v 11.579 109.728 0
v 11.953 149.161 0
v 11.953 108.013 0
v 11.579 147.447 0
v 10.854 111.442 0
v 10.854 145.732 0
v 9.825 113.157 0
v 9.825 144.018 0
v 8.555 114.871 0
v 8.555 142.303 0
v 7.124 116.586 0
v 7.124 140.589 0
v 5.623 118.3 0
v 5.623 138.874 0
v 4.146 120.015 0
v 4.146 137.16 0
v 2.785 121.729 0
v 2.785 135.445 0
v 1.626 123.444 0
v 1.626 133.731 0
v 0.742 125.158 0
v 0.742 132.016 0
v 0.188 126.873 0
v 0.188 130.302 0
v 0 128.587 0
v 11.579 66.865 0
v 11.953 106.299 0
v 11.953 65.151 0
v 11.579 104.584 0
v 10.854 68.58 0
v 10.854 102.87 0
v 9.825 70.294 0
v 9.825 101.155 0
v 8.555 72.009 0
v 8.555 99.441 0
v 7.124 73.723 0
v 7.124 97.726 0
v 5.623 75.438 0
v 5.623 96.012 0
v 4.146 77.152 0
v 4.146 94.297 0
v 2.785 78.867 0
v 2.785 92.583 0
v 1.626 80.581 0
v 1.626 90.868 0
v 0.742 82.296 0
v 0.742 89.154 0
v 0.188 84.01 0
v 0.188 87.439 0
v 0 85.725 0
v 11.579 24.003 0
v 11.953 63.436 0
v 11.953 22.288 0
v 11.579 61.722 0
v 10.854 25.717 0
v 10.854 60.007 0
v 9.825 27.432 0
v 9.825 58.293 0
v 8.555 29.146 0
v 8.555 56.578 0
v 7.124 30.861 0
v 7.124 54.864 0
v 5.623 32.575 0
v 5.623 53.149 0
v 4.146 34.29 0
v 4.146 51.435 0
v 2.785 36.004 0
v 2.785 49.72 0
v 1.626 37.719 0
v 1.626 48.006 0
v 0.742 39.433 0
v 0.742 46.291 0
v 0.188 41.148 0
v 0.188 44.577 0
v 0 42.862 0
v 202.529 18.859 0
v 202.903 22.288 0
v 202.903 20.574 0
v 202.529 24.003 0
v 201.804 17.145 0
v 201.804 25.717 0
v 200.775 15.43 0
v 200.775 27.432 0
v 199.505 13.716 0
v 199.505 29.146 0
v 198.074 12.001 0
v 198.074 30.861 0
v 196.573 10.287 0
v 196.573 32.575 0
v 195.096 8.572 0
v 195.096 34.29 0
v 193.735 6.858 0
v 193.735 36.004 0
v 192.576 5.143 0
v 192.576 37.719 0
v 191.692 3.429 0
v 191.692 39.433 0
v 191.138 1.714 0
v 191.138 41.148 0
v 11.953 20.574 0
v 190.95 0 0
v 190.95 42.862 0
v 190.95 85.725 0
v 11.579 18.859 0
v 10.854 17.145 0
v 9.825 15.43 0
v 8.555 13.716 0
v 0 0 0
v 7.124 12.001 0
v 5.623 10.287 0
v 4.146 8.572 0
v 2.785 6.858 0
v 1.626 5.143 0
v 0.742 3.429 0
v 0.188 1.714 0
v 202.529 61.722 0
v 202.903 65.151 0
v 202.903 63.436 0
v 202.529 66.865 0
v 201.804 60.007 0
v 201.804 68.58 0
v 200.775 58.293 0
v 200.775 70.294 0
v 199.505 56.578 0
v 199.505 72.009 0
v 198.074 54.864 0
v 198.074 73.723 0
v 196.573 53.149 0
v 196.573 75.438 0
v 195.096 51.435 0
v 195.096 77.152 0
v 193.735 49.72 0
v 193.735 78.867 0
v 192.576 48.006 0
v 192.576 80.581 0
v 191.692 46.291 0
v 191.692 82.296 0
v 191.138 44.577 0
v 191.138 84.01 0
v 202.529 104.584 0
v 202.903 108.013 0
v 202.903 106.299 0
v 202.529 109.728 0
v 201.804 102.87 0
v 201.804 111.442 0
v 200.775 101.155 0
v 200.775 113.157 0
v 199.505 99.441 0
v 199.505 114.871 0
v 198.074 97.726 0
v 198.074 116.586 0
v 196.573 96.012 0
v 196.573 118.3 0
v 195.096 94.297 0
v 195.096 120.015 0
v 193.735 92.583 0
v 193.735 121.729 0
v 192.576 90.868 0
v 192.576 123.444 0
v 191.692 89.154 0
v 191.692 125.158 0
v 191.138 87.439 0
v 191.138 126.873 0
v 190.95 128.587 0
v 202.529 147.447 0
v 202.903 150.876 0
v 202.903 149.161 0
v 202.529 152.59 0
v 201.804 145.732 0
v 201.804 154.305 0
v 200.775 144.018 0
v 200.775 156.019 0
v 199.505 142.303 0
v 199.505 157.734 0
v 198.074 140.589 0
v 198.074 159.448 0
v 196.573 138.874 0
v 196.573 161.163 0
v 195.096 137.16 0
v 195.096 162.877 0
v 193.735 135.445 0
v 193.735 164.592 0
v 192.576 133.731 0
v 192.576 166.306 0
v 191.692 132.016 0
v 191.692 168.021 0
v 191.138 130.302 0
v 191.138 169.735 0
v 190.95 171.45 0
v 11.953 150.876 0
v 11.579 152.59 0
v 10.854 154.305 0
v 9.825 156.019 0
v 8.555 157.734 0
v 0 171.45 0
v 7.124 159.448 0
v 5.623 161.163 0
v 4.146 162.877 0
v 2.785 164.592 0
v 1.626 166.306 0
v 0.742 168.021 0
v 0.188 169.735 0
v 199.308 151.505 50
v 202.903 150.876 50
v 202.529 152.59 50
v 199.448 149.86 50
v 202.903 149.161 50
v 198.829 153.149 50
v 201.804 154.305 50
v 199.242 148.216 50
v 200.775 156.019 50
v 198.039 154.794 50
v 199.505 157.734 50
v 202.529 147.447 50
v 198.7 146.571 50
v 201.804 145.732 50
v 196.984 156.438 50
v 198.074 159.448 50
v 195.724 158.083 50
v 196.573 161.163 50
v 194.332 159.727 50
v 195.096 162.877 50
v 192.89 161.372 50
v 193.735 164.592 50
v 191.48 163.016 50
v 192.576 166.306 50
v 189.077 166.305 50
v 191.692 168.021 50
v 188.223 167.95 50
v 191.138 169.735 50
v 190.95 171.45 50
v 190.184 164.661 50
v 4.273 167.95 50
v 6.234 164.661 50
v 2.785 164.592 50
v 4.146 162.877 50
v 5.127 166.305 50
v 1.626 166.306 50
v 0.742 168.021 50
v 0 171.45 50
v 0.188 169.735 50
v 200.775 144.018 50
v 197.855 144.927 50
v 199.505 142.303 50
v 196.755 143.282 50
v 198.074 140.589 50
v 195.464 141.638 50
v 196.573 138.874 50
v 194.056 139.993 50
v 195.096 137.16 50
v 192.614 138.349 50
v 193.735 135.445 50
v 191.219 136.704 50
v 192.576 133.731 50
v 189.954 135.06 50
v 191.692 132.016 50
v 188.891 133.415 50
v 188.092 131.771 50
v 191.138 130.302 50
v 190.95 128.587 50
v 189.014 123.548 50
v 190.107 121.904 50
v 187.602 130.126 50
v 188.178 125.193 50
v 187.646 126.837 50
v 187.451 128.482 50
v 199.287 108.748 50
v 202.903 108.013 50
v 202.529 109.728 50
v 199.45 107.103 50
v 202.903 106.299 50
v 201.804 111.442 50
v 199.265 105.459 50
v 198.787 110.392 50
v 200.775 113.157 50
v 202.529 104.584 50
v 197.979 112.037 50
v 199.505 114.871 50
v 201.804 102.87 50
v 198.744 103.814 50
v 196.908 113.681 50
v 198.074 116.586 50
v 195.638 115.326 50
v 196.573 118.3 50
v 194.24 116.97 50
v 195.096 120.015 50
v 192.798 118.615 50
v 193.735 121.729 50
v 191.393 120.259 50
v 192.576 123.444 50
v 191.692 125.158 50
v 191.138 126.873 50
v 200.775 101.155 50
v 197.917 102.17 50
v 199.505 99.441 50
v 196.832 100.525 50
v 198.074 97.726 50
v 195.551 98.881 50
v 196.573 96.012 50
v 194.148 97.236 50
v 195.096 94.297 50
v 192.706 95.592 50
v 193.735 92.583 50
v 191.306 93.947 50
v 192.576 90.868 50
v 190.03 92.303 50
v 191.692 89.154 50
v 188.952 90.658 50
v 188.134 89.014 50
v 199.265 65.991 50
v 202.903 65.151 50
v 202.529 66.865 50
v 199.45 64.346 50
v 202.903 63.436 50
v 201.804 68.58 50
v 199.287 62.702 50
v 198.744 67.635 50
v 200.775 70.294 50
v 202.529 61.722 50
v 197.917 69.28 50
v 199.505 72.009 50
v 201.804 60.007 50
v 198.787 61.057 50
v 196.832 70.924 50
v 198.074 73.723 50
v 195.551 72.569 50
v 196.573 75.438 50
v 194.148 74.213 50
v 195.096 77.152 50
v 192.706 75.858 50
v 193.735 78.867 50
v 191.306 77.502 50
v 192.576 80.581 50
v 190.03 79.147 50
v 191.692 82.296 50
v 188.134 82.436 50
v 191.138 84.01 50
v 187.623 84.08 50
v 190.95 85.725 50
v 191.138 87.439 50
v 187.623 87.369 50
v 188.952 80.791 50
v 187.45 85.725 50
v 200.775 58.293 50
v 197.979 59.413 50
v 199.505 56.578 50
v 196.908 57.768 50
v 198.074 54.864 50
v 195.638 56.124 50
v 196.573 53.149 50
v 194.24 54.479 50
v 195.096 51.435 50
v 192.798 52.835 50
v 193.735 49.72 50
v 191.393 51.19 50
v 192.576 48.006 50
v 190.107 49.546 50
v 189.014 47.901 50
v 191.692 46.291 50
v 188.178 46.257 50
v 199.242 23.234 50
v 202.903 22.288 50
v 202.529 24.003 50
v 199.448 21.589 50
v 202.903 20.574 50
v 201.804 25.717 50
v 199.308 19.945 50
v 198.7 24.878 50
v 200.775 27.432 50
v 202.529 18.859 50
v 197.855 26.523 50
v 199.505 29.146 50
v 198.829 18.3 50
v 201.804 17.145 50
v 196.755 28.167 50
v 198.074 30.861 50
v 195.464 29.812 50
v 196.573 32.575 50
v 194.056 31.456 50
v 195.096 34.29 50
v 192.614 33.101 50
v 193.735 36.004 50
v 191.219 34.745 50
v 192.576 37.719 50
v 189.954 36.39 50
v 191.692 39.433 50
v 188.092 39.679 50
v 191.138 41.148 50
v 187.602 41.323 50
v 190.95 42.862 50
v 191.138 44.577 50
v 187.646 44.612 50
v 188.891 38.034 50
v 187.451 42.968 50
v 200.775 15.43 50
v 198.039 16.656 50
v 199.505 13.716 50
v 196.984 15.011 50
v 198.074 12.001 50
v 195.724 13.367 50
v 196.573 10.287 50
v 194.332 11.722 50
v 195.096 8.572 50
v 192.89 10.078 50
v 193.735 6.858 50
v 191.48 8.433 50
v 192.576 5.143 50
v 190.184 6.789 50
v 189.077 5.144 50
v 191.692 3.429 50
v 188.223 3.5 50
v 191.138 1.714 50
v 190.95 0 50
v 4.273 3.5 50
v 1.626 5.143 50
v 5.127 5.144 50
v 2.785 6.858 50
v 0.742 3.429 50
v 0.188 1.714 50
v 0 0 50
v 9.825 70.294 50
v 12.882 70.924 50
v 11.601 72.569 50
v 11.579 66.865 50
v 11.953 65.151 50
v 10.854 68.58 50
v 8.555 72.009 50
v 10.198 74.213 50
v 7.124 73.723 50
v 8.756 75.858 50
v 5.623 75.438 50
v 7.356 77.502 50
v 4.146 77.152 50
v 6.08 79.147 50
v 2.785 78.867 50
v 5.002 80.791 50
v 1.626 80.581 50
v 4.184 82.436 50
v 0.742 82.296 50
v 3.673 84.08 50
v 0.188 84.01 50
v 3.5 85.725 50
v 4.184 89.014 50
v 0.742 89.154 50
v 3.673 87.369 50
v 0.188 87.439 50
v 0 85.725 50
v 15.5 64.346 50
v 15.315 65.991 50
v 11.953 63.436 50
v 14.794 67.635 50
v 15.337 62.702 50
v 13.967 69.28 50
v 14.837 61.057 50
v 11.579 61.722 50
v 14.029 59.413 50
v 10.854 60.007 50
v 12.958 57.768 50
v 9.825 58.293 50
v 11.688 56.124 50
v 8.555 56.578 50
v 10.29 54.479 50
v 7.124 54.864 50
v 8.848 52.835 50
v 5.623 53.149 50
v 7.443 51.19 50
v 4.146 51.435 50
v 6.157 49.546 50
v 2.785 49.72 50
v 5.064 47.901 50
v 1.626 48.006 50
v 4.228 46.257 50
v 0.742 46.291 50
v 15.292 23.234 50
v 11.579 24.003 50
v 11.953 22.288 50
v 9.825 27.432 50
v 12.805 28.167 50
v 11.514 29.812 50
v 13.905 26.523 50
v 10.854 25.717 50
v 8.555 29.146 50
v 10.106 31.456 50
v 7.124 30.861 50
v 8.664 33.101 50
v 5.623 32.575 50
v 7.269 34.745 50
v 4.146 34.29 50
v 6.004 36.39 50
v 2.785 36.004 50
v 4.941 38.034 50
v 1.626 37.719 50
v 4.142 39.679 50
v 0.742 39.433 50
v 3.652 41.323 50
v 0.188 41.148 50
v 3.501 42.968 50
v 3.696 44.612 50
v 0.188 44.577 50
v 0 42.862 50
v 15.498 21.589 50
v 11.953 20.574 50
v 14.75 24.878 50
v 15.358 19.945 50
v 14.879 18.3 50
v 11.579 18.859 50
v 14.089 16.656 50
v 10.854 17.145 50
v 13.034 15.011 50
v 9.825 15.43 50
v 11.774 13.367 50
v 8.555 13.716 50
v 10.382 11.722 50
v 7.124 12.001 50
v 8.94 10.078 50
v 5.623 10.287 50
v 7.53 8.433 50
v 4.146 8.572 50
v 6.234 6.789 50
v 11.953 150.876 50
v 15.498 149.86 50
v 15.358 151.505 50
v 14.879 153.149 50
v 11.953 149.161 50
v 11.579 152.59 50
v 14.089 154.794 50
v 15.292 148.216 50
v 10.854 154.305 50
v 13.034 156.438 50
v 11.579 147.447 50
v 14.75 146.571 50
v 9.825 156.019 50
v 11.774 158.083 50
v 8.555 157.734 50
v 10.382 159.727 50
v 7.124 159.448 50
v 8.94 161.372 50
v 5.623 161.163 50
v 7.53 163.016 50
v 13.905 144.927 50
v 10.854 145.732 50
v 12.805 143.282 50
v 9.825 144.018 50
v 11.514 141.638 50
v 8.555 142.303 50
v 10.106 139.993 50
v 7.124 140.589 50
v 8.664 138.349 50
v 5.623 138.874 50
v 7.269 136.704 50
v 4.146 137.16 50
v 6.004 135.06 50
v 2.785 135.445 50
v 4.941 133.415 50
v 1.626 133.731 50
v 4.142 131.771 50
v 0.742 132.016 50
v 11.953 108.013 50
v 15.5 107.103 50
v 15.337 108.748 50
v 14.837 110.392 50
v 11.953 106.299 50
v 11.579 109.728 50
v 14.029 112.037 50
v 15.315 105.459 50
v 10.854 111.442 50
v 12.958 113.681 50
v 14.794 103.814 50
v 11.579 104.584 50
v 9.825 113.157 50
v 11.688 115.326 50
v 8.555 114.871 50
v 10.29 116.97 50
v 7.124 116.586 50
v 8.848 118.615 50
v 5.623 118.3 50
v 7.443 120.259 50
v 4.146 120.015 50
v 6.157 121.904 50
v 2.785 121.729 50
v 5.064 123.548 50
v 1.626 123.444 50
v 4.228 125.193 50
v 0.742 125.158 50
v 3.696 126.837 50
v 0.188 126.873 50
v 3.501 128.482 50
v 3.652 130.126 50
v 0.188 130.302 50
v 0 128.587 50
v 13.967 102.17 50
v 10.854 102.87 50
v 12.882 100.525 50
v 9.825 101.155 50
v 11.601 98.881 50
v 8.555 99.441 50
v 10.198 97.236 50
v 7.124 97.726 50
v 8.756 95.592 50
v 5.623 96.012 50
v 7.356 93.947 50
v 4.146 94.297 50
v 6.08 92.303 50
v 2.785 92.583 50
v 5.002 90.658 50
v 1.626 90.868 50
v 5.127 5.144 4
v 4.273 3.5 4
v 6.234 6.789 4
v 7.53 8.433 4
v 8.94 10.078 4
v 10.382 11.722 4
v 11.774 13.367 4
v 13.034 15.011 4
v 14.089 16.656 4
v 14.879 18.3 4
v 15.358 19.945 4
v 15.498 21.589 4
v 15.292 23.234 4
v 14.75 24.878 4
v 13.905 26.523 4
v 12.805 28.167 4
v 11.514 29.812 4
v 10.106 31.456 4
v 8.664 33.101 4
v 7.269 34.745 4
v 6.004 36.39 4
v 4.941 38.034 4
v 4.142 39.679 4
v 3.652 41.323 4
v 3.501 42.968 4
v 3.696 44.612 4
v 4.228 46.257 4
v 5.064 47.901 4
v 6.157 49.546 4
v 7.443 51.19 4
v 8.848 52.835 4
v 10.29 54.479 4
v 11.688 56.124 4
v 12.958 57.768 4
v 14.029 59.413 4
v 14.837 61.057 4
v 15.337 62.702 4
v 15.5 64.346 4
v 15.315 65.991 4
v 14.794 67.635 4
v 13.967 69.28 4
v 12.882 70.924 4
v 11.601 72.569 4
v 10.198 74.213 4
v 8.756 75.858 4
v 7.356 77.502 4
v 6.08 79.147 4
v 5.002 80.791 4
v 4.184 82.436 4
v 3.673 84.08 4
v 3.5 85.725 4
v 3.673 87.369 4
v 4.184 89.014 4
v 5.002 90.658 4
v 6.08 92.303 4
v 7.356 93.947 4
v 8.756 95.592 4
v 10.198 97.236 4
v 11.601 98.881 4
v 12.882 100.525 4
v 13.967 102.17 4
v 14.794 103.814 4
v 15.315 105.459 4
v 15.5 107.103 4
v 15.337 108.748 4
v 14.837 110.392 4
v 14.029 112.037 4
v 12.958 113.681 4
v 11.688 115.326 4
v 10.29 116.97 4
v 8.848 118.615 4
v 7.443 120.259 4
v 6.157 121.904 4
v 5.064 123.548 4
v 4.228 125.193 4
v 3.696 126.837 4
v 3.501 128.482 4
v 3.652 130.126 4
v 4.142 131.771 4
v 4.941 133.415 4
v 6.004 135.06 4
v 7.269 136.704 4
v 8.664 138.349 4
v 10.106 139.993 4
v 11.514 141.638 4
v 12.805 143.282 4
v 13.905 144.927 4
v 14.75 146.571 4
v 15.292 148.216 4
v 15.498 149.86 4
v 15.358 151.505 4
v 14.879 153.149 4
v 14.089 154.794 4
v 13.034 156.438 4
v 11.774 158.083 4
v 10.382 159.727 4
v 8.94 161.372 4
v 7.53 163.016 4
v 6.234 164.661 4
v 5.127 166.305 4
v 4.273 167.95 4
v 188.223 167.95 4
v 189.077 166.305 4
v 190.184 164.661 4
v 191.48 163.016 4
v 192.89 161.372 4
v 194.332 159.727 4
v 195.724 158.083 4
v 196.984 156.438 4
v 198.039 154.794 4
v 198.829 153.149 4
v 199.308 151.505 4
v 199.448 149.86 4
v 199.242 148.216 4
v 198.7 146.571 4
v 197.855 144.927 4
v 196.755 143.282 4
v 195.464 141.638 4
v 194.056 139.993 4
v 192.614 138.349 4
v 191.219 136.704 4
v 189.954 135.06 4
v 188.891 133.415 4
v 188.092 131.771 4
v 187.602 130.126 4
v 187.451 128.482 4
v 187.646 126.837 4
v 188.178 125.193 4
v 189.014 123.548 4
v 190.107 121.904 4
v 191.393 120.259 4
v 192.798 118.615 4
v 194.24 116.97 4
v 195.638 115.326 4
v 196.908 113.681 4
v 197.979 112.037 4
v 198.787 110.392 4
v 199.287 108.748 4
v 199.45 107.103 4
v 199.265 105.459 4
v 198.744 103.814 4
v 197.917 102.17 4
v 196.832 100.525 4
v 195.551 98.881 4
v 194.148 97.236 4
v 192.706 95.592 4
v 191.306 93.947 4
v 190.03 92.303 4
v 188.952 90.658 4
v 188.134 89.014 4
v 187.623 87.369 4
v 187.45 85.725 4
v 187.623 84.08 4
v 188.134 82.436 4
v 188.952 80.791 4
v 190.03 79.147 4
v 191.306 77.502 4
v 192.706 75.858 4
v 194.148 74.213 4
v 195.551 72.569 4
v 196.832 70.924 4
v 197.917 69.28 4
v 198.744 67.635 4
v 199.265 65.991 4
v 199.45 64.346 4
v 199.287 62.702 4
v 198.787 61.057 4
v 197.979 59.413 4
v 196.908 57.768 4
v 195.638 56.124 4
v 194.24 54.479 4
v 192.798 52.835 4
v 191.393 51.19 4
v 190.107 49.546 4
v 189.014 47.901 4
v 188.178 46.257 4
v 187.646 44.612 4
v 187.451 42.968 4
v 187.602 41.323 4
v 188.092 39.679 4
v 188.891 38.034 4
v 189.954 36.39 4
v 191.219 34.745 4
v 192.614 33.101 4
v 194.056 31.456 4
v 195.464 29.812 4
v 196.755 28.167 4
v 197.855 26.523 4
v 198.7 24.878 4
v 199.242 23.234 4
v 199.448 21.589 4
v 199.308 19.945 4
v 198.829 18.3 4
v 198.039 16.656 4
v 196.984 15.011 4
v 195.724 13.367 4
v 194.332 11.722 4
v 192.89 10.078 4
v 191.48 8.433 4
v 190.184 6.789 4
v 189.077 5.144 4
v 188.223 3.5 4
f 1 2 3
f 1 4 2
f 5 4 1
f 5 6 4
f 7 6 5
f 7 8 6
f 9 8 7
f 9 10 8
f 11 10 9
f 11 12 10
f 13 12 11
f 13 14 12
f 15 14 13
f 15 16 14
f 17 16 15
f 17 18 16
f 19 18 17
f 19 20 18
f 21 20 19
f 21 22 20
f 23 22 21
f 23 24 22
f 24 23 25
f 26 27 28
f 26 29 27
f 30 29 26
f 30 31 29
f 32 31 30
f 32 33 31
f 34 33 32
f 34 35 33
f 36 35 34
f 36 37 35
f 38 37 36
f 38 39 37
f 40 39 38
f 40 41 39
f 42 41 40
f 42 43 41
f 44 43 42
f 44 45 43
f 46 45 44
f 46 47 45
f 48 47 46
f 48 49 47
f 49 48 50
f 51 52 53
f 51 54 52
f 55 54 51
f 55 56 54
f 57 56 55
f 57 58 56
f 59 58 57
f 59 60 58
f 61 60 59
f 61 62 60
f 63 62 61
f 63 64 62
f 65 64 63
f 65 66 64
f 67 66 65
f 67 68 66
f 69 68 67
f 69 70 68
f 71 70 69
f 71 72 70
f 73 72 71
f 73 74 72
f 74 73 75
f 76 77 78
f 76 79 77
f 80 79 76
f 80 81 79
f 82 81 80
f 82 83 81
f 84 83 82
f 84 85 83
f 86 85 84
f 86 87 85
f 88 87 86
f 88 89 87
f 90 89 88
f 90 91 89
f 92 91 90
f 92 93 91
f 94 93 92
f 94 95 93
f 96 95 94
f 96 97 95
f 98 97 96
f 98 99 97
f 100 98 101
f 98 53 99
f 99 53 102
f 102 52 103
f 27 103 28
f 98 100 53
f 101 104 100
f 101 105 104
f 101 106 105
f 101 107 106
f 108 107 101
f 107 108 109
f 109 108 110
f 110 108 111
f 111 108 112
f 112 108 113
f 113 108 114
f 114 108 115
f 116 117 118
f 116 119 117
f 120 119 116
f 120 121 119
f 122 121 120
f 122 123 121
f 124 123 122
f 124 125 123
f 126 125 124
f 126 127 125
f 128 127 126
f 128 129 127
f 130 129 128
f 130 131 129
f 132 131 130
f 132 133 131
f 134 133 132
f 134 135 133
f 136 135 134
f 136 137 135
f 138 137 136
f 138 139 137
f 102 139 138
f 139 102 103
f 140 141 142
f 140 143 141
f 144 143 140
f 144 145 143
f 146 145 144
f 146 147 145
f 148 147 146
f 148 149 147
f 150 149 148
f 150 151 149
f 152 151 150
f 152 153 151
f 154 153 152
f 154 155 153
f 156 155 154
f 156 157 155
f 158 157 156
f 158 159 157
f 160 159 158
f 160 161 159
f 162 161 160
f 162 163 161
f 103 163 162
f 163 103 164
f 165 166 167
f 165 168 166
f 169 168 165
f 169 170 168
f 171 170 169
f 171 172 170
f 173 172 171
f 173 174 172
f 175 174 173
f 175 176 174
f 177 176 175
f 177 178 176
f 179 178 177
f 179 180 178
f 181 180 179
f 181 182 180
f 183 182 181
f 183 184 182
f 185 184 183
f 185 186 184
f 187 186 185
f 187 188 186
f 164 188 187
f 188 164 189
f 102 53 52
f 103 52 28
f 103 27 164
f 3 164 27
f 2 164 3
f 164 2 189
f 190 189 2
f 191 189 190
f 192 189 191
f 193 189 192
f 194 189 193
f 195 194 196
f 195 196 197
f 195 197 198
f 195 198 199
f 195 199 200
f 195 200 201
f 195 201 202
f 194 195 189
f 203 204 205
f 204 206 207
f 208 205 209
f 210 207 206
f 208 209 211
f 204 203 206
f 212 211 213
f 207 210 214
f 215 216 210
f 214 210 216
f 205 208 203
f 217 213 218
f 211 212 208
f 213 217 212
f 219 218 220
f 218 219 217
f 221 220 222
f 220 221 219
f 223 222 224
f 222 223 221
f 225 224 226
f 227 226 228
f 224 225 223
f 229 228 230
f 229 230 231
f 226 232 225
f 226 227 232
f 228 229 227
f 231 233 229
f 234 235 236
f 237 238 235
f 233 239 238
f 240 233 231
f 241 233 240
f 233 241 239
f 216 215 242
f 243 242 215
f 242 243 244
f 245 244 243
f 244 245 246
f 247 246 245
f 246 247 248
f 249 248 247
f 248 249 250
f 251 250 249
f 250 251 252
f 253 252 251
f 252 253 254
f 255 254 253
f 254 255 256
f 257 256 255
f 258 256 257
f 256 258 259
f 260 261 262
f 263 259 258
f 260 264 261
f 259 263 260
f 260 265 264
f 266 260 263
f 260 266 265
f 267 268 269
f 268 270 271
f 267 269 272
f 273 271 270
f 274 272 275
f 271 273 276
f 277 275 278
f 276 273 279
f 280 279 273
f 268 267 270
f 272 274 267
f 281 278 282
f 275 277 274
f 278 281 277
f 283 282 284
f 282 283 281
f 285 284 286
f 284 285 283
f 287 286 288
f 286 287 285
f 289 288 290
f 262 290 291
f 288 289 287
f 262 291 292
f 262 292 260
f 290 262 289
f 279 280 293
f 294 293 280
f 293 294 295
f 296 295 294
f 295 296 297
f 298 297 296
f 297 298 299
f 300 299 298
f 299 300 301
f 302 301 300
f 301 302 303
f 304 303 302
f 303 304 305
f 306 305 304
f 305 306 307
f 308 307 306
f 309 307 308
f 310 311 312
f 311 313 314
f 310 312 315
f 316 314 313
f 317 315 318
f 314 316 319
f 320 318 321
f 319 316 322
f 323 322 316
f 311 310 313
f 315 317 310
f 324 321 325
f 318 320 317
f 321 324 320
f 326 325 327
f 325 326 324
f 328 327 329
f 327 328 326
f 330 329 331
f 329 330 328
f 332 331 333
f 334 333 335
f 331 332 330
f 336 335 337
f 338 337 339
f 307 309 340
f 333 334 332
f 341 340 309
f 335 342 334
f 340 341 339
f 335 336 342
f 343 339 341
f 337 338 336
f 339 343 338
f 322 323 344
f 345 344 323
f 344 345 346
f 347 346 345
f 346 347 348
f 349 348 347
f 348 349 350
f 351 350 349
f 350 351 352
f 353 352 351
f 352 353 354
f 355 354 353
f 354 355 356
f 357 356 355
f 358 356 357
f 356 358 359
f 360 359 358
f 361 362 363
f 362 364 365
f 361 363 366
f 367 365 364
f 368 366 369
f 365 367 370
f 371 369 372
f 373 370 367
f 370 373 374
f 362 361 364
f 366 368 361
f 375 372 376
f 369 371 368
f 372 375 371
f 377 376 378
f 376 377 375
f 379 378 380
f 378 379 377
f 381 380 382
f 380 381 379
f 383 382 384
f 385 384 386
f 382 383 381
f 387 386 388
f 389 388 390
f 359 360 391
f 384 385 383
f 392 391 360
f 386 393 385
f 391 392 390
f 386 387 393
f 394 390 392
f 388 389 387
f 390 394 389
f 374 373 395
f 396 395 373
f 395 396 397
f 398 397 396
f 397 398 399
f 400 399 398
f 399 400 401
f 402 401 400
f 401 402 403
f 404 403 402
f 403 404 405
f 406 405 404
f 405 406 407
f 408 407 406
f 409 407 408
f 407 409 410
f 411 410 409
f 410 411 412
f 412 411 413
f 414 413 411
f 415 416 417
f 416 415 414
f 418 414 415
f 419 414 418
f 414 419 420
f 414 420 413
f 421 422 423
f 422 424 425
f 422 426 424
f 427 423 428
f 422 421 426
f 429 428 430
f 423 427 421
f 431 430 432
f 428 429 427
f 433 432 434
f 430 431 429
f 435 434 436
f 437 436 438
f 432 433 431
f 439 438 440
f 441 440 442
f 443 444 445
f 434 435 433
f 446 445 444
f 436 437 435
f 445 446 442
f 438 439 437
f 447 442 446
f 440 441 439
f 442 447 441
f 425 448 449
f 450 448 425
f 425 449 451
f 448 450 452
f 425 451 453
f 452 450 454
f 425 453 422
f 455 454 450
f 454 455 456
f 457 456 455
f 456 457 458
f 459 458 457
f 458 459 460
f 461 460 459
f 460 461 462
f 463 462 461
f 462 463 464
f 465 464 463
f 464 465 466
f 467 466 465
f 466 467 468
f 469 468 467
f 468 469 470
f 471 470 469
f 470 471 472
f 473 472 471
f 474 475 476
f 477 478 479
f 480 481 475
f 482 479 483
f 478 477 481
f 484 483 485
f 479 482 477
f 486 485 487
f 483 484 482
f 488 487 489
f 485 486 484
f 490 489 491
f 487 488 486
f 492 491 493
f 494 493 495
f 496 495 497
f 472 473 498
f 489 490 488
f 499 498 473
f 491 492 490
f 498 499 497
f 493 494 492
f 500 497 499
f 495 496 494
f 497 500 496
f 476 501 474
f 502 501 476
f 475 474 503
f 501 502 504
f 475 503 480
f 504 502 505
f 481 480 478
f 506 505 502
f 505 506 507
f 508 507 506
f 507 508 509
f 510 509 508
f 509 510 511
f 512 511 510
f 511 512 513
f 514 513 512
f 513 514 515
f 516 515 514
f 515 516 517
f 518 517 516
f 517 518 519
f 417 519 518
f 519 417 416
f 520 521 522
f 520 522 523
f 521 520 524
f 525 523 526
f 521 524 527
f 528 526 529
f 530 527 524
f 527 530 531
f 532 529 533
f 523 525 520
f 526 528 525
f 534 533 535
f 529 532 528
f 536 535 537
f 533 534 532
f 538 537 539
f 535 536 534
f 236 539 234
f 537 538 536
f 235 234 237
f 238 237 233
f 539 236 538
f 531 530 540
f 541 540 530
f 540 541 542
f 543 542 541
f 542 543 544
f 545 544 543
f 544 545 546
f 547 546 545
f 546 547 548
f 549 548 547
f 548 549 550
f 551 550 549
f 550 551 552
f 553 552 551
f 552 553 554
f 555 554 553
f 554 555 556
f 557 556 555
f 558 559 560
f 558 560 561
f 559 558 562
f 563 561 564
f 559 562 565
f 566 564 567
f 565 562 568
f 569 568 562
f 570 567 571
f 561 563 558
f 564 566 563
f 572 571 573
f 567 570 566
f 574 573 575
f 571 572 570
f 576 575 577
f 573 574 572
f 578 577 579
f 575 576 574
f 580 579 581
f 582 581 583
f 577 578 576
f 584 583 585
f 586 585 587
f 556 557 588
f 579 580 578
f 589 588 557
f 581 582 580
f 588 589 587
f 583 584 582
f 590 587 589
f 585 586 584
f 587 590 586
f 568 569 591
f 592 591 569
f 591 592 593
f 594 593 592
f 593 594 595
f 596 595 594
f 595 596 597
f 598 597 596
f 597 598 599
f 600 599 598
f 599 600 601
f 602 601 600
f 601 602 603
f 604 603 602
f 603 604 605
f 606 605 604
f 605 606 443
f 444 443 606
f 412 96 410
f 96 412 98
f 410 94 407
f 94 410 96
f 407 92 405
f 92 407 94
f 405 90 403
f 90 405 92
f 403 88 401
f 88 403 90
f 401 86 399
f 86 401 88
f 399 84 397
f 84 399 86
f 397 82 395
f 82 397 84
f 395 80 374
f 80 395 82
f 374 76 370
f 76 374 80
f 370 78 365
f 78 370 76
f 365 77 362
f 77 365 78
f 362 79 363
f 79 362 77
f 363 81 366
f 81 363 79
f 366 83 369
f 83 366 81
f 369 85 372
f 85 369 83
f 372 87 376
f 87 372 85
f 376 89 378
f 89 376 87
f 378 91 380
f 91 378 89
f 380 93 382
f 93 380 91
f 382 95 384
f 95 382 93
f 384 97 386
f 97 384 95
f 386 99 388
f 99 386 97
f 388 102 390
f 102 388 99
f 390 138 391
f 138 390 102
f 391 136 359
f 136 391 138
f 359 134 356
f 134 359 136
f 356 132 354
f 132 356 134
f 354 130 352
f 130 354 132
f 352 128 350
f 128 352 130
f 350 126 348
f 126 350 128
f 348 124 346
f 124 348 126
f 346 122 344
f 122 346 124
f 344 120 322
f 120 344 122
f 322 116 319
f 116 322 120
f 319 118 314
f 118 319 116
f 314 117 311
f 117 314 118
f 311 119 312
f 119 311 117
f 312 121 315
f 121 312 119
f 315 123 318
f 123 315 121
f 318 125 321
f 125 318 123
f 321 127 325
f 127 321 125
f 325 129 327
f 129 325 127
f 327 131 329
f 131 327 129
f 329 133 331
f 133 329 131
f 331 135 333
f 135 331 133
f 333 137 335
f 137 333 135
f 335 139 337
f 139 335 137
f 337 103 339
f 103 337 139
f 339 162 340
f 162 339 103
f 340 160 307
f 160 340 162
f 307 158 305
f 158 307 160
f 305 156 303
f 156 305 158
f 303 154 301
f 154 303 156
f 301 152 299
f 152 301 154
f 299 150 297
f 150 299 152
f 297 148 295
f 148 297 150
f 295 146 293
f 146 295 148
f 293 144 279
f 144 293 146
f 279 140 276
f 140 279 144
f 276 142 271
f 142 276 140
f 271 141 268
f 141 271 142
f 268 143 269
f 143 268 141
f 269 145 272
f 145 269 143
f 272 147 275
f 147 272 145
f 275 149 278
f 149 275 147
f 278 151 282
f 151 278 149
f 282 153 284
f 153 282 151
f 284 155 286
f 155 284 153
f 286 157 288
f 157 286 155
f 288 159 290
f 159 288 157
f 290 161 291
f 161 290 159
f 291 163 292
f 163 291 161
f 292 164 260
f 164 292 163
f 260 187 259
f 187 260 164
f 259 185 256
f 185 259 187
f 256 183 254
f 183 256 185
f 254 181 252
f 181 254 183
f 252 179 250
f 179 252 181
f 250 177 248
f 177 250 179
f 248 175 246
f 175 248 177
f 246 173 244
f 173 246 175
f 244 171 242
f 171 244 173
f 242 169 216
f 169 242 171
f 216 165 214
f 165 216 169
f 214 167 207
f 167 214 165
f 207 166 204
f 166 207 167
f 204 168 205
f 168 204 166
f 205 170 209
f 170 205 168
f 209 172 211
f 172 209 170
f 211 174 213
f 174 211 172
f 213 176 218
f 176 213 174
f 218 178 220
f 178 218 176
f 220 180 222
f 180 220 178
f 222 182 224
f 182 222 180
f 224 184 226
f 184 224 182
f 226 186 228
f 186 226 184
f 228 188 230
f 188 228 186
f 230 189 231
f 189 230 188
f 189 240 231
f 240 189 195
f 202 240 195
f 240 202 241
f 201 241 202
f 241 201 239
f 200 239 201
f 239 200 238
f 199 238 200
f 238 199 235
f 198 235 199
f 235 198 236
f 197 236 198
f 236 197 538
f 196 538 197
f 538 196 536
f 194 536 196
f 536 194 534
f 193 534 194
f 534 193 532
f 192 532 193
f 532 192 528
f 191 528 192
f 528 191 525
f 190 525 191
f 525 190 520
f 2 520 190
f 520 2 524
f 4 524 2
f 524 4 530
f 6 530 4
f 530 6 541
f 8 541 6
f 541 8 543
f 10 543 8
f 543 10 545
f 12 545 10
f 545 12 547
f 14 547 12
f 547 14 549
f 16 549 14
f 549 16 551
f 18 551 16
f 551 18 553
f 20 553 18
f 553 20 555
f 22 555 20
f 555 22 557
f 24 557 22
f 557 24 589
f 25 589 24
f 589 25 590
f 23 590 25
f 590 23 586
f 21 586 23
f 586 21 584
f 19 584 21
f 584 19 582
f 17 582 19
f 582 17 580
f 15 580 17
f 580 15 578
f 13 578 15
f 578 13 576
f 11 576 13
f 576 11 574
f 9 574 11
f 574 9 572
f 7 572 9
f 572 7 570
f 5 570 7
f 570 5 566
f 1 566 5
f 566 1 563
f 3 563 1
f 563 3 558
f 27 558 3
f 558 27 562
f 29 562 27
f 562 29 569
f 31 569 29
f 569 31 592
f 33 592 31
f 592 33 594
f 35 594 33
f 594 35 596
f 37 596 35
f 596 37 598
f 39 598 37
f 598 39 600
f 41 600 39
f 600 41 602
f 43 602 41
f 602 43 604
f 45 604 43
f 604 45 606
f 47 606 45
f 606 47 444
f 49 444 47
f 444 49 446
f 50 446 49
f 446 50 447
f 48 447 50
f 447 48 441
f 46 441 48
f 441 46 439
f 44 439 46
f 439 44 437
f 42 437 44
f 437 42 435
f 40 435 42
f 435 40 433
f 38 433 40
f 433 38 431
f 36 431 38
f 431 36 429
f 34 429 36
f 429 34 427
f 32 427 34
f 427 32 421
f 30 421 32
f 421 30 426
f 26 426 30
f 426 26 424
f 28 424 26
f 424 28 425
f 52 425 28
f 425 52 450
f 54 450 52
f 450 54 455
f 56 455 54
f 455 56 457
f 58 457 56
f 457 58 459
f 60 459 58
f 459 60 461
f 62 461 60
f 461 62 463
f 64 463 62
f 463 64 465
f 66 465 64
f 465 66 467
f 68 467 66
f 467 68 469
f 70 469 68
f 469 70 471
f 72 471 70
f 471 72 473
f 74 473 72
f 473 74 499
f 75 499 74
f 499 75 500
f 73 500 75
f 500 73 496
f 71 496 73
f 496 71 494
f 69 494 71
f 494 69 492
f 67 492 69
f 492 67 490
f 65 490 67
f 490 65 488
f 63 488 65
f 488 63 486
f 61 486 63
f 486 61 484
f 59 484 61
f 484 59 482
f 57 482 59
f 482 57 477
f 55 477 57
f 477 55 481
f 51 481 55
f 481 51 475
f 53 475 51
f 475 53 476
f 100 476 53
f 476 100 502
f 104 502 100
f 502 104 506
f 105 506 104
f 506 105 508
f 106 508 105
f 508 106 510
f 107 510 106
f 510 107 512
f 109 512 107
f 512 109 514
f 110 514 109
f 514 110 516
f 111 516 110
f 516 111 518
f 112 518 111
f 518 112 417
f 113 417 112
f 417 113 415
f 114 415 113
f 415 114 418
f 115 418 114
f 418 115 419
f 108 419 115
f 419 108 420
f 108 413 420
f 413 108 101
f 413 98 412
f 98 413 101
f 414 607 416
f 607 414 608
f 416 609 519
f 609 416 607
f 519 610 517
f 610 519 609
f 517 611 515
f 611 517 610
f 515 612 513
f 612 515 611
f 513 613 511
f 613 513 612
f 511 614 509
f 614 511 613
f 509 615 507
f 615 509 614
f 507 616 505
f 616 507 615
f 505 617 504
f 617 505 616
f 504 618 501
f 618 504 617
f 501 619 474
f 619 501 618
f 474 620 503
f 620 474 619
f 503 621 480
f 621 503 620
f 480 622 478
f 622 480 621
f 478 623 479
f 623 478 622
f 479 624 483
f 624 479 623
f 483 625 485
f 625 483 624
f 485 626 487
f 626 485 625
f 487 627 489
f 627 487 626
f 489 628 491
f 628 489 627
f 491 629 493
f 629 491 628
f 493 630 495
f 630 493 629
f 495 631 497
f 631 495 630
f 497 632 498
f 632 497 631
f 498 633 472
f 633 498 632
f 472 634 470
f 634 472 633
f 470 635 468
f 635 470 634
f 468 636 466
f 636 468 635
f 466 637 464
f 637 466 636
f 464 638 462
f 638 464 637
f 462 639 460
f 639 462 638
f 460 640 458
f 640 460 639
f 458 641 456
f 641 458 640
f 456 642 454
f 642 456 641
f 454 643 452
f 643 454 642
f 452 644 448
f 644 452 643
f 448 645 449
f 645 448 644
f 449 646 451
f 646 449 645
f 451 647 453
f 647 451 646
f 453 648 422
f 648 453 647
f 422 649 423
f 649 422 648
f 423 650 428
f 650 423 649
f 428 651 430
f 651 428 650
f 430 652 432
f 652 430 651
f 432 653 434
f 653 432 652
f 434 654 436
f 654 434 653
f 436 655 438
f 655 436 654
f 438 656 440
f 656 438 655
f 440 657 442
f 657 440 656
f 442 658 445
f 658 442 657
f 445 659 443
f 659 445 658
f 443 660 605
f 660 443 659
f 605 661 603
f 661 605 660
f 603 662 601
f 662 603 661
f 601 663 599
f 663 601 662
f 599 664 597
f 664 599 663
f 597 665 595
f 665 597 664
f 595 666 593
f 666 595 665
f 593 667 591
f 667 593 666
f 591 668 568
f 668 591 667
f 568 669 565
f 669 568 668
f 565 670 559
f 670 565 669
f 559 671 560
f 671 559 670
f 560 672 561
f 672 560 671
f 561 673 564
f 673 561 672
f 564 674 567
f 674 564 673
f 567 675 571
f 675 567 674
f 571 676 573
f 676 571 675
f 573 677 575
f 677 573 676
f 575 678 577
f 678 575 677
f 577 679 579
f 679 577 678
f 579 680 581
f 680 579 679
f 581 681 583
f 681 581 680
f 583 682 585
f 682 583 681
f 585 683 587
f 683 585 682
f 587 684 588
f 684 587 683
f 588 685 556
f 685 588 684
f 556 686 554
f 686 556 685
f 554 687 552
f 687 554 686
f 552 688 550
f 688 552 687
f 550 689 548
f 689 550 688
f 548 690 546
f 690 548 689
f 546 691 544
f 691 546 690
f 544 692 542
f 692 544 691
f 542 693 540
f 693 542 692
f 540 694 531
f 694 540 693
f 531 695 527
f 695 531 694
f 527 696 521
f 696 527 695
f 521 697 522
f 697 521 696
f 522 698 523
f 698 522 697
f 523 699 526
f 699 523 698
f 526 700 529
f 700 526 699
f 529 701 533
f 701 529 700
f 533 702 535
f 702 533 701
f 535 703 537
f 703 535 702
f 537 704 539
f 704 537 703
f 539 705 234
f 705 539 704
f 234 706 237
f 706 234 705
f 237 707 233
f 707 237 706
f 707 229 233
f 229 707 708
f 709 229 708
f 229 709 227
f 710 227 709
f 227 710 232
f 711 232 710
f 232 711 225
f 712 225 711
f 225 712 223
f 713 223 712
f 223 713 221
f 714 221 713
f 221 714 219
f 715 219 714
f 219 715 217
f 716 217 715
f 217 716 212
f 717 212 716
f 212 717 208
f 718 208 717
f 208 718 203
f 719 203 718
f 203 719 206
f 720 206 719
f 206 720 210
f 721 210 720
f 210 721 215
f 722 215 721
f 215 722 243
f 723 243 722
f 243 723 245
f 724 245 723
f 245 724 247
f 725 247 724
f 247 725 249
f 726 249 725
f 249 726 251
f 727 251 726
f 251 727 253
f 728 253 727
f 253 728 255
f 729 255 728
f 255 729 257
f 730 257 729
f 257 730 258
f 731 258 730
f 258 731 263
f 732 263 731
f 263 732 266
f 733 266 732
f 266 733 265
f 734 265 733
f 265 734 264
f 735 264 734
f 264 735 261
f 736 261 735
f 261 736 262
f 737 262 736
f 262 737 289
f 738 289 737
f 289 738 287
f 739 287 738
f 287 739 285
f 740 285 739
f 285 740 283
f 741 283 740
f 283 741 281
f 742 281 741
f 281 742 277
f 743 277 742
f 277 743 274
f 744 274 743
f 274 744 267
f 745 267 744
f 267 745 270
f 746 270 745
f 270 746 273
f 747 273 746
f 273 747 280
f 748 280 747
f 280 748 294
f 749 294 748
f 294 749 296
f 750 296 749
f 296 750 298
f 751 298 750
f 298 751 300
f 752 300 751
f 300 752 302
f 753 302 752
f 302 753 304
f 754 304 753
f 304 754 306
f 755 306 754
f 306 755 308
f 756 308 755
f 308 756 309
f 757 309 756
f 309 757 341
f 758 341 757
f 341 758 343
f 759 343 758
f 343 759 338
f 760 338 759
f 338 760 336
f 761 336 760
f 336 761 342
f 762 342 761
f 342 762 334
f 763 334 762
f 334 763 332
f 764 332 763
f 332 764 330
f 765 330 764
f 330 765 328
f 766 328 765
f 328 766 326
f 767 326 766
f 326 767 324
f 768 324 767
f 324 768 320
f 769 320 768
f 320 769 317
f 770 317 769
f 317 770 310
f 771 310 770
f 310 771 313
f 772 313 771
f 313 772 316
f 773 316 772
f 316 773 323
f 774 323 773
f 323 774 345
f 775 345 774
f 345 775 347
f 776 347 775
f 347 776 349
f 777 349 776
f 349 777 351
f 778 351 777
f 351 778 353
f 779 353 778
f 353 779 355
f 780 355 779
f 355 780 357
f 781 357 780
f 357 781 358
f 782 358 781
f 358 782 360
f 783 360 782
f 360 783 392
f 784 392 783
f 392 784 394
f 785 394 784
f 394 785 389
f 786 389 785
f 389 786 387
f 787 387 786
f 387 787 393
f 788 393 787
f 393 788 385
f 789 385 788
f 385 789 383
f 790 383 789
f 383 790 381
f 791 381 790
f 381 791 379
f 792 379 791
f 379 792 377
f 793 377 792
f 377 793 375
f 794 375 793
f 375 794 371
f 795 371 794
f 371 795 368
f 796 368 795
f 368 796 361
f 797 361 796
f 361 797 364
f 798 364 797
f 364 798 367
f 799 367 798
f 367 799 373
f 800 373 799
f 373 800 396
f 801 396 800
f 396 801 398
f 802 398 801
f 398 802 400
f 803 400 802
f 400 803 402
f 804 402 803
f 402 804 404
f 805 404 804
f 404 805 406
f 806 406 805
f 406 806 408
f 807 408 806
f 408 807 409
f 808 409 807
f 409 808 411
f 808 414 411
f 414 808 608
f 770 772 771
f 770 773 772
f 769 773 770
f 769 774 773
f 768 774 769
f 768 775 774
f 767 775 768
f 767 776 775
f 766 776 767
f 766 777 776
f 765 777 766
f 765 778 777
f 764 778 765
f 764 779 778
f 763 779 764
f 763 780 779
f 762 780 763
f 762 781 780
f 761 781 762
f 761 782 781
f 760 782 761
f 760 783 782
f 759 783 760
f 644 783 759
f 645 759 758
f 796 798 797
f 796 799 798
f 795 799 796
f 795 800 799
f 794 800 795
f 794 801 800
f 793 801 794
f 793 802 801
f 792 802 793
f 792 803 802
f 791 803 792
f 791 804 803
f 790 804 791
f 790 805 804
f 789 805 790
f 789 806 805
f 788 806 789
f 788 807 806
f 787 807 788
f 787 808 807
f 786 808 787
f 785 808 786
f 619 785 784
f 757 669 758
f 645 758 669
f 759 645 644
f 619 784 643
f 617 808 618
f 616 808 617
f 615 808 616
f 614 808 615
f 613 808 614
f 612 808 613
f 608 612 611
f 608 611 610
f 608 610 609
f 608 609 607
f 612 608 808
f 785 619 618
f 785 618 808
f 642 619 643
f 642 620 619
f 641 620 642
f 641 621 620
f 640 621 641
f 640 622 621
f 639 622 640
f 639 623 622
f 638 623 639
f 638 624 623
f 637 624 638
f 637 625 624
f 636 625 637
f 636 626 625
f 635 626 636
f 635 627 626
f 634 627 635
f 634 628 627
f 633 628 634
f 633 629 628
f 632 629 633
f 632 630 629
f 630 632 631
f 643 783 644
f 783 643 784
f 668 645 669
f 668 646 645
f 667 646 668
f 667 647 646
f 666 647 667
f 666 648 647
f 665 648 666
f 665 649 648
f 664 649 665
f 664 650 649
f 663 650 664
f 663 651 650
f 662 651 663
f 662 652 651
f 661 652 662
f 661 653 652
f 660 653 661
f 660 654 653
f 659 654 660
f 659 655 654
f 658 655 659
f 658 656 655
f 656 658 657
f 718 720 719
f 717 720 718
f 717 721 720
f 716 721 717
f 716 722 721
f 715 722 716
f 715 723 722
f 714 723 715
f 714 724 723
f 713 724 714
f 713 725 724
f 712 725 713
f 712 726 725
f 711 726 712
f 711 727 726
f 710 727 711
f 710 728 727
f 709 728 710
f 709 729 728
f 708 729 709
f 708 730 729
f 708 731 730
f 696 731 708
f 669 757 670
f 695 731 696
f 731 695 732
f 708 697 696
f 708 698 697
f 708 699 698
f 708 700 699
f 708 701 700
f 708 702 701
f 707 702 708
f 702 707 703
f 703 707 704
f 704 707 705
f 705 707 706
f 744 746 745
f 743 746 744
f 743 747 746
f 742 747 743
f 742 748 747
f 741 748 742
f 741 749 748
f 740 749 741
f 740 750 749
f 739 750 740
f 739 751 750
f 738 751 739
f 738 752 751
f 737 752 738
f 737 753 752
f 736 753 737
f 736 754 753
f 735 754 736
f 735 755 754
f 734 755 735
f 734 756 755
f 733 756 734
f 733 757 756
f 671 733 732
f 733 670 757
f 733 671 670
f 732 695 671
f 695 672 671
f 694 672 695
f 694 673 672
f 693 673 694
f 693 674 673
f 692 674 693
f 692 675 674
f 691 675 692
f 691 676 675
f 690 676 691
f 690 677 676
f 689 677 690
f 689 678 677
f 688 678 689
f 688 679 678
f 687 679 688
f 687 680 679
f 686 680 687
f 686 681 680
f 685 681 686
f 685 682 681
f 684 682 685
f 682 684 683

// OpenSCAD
// Test script for inward-zag profile and horizontal screw slit
H = 6.75 * 25.4; // 6.75 inches (~171.45 mm)
W = 8.0 * 25.4;  // 8.0 inches (203.2 mm)
wall_t = 3.5;
back_t = 4.0;
amp = 12.0;
num_cycles = 4;
clearance = 0.25;

// Horizontal Slit Cutter module
module horizontal_screw_slit(x, z, shaft_d, head_d, slot_w, wall_t) {
    translate([x, -0.1, z])
    rotate([-90, 0, 0])
    union() {
        // Horizontal slot for screw shaft (allows left-right adjustment)
        hull() {
            translate([-slot_w/2, 0, 0])
                cylinder(d = shaft_d + 0.3, h = wall_t + 0.5, $fn = 32);
            translate([slot_w/2, 0, 0])
                cylinder(d = shaft_d + 0.3, h = wall_t + 0.5, $fn = 32);
        }
        // Counterbore / head recess slot for screw head
        hull() {
            translate([-slot_w/2, 0, -0.1])
                cylinder(d = head_d + 0.5, h = wall_t/2 + 0.1, $fn = 32);
            translate([slot_w/2, 0, -0.1])
                cylinder(d = head_d + 0.5, h = wall_t/2 + 0.1, $fn = 32);
        }
    }
}

// Inward-zag wave function (0 at z=0 and z=H, going inward into box)
function zig_inward(z, H, num_cycles, amp) = 
    (amp / 2) * (1 - cos(360 * num_cycles * z / H));

// Left outer wall points: X_left = zig_inward(z) (starts at 0, goes +X inward into box)
// Right outer wall points: X_right = W - amp + zig_inward(z) - clearance
function outer_profile_inward(W, H, num_cycles, amp, clearance, steps=100) =
    concat(
        [ for (i = [0 : steps]) 
            let (z = i * H / steps)
            [ zig_inward(z, H, num_cycles, amp), z ] 
        ],
        [ for (i = [steps : -1 : 0]) 
            let (z = i * H / steps)
            [ W - amp + zig_inward(z, H, num_cycles, amp) - clearance, z ] 
        ]
    );

function inner_profile_inward(W, H, wall, num_cycles, amp, clearance, steps=100) =
    concat(
        [ for (i = [0 : steps]) 
            let (z = wall + i * (H - 2*wall) / steps)
            [ wall + zig_inward(z, H, num_cycles, amp), z ] 
        ],
        [ for (i = [steps : -1 : 0]) 
            let (z = wall + i * (H - 2*wall) / steps)
            [ W - wall - amp + zig_inward(z, H, num_cycles, amp) - clearance, z ] 
        ]
    );

difference() {
    union() {
        linear_extrude(height = 50)
            difference() {
                polygon(outer_profile_inward(W, H, num_cycles, amp, clearance));
                polygon(inner_profile_inward(W, H, wall_t, num_cycles, amp, clearance));
            }
        linear_extrude(height = back_t)
            polygon(outer_profile_inward(W, H, num_cycles, amp, clearance));
    }
    horizontal_screw_slit(W/2, H/2, 4.5, 9.0, 25.0, back_t);
}
